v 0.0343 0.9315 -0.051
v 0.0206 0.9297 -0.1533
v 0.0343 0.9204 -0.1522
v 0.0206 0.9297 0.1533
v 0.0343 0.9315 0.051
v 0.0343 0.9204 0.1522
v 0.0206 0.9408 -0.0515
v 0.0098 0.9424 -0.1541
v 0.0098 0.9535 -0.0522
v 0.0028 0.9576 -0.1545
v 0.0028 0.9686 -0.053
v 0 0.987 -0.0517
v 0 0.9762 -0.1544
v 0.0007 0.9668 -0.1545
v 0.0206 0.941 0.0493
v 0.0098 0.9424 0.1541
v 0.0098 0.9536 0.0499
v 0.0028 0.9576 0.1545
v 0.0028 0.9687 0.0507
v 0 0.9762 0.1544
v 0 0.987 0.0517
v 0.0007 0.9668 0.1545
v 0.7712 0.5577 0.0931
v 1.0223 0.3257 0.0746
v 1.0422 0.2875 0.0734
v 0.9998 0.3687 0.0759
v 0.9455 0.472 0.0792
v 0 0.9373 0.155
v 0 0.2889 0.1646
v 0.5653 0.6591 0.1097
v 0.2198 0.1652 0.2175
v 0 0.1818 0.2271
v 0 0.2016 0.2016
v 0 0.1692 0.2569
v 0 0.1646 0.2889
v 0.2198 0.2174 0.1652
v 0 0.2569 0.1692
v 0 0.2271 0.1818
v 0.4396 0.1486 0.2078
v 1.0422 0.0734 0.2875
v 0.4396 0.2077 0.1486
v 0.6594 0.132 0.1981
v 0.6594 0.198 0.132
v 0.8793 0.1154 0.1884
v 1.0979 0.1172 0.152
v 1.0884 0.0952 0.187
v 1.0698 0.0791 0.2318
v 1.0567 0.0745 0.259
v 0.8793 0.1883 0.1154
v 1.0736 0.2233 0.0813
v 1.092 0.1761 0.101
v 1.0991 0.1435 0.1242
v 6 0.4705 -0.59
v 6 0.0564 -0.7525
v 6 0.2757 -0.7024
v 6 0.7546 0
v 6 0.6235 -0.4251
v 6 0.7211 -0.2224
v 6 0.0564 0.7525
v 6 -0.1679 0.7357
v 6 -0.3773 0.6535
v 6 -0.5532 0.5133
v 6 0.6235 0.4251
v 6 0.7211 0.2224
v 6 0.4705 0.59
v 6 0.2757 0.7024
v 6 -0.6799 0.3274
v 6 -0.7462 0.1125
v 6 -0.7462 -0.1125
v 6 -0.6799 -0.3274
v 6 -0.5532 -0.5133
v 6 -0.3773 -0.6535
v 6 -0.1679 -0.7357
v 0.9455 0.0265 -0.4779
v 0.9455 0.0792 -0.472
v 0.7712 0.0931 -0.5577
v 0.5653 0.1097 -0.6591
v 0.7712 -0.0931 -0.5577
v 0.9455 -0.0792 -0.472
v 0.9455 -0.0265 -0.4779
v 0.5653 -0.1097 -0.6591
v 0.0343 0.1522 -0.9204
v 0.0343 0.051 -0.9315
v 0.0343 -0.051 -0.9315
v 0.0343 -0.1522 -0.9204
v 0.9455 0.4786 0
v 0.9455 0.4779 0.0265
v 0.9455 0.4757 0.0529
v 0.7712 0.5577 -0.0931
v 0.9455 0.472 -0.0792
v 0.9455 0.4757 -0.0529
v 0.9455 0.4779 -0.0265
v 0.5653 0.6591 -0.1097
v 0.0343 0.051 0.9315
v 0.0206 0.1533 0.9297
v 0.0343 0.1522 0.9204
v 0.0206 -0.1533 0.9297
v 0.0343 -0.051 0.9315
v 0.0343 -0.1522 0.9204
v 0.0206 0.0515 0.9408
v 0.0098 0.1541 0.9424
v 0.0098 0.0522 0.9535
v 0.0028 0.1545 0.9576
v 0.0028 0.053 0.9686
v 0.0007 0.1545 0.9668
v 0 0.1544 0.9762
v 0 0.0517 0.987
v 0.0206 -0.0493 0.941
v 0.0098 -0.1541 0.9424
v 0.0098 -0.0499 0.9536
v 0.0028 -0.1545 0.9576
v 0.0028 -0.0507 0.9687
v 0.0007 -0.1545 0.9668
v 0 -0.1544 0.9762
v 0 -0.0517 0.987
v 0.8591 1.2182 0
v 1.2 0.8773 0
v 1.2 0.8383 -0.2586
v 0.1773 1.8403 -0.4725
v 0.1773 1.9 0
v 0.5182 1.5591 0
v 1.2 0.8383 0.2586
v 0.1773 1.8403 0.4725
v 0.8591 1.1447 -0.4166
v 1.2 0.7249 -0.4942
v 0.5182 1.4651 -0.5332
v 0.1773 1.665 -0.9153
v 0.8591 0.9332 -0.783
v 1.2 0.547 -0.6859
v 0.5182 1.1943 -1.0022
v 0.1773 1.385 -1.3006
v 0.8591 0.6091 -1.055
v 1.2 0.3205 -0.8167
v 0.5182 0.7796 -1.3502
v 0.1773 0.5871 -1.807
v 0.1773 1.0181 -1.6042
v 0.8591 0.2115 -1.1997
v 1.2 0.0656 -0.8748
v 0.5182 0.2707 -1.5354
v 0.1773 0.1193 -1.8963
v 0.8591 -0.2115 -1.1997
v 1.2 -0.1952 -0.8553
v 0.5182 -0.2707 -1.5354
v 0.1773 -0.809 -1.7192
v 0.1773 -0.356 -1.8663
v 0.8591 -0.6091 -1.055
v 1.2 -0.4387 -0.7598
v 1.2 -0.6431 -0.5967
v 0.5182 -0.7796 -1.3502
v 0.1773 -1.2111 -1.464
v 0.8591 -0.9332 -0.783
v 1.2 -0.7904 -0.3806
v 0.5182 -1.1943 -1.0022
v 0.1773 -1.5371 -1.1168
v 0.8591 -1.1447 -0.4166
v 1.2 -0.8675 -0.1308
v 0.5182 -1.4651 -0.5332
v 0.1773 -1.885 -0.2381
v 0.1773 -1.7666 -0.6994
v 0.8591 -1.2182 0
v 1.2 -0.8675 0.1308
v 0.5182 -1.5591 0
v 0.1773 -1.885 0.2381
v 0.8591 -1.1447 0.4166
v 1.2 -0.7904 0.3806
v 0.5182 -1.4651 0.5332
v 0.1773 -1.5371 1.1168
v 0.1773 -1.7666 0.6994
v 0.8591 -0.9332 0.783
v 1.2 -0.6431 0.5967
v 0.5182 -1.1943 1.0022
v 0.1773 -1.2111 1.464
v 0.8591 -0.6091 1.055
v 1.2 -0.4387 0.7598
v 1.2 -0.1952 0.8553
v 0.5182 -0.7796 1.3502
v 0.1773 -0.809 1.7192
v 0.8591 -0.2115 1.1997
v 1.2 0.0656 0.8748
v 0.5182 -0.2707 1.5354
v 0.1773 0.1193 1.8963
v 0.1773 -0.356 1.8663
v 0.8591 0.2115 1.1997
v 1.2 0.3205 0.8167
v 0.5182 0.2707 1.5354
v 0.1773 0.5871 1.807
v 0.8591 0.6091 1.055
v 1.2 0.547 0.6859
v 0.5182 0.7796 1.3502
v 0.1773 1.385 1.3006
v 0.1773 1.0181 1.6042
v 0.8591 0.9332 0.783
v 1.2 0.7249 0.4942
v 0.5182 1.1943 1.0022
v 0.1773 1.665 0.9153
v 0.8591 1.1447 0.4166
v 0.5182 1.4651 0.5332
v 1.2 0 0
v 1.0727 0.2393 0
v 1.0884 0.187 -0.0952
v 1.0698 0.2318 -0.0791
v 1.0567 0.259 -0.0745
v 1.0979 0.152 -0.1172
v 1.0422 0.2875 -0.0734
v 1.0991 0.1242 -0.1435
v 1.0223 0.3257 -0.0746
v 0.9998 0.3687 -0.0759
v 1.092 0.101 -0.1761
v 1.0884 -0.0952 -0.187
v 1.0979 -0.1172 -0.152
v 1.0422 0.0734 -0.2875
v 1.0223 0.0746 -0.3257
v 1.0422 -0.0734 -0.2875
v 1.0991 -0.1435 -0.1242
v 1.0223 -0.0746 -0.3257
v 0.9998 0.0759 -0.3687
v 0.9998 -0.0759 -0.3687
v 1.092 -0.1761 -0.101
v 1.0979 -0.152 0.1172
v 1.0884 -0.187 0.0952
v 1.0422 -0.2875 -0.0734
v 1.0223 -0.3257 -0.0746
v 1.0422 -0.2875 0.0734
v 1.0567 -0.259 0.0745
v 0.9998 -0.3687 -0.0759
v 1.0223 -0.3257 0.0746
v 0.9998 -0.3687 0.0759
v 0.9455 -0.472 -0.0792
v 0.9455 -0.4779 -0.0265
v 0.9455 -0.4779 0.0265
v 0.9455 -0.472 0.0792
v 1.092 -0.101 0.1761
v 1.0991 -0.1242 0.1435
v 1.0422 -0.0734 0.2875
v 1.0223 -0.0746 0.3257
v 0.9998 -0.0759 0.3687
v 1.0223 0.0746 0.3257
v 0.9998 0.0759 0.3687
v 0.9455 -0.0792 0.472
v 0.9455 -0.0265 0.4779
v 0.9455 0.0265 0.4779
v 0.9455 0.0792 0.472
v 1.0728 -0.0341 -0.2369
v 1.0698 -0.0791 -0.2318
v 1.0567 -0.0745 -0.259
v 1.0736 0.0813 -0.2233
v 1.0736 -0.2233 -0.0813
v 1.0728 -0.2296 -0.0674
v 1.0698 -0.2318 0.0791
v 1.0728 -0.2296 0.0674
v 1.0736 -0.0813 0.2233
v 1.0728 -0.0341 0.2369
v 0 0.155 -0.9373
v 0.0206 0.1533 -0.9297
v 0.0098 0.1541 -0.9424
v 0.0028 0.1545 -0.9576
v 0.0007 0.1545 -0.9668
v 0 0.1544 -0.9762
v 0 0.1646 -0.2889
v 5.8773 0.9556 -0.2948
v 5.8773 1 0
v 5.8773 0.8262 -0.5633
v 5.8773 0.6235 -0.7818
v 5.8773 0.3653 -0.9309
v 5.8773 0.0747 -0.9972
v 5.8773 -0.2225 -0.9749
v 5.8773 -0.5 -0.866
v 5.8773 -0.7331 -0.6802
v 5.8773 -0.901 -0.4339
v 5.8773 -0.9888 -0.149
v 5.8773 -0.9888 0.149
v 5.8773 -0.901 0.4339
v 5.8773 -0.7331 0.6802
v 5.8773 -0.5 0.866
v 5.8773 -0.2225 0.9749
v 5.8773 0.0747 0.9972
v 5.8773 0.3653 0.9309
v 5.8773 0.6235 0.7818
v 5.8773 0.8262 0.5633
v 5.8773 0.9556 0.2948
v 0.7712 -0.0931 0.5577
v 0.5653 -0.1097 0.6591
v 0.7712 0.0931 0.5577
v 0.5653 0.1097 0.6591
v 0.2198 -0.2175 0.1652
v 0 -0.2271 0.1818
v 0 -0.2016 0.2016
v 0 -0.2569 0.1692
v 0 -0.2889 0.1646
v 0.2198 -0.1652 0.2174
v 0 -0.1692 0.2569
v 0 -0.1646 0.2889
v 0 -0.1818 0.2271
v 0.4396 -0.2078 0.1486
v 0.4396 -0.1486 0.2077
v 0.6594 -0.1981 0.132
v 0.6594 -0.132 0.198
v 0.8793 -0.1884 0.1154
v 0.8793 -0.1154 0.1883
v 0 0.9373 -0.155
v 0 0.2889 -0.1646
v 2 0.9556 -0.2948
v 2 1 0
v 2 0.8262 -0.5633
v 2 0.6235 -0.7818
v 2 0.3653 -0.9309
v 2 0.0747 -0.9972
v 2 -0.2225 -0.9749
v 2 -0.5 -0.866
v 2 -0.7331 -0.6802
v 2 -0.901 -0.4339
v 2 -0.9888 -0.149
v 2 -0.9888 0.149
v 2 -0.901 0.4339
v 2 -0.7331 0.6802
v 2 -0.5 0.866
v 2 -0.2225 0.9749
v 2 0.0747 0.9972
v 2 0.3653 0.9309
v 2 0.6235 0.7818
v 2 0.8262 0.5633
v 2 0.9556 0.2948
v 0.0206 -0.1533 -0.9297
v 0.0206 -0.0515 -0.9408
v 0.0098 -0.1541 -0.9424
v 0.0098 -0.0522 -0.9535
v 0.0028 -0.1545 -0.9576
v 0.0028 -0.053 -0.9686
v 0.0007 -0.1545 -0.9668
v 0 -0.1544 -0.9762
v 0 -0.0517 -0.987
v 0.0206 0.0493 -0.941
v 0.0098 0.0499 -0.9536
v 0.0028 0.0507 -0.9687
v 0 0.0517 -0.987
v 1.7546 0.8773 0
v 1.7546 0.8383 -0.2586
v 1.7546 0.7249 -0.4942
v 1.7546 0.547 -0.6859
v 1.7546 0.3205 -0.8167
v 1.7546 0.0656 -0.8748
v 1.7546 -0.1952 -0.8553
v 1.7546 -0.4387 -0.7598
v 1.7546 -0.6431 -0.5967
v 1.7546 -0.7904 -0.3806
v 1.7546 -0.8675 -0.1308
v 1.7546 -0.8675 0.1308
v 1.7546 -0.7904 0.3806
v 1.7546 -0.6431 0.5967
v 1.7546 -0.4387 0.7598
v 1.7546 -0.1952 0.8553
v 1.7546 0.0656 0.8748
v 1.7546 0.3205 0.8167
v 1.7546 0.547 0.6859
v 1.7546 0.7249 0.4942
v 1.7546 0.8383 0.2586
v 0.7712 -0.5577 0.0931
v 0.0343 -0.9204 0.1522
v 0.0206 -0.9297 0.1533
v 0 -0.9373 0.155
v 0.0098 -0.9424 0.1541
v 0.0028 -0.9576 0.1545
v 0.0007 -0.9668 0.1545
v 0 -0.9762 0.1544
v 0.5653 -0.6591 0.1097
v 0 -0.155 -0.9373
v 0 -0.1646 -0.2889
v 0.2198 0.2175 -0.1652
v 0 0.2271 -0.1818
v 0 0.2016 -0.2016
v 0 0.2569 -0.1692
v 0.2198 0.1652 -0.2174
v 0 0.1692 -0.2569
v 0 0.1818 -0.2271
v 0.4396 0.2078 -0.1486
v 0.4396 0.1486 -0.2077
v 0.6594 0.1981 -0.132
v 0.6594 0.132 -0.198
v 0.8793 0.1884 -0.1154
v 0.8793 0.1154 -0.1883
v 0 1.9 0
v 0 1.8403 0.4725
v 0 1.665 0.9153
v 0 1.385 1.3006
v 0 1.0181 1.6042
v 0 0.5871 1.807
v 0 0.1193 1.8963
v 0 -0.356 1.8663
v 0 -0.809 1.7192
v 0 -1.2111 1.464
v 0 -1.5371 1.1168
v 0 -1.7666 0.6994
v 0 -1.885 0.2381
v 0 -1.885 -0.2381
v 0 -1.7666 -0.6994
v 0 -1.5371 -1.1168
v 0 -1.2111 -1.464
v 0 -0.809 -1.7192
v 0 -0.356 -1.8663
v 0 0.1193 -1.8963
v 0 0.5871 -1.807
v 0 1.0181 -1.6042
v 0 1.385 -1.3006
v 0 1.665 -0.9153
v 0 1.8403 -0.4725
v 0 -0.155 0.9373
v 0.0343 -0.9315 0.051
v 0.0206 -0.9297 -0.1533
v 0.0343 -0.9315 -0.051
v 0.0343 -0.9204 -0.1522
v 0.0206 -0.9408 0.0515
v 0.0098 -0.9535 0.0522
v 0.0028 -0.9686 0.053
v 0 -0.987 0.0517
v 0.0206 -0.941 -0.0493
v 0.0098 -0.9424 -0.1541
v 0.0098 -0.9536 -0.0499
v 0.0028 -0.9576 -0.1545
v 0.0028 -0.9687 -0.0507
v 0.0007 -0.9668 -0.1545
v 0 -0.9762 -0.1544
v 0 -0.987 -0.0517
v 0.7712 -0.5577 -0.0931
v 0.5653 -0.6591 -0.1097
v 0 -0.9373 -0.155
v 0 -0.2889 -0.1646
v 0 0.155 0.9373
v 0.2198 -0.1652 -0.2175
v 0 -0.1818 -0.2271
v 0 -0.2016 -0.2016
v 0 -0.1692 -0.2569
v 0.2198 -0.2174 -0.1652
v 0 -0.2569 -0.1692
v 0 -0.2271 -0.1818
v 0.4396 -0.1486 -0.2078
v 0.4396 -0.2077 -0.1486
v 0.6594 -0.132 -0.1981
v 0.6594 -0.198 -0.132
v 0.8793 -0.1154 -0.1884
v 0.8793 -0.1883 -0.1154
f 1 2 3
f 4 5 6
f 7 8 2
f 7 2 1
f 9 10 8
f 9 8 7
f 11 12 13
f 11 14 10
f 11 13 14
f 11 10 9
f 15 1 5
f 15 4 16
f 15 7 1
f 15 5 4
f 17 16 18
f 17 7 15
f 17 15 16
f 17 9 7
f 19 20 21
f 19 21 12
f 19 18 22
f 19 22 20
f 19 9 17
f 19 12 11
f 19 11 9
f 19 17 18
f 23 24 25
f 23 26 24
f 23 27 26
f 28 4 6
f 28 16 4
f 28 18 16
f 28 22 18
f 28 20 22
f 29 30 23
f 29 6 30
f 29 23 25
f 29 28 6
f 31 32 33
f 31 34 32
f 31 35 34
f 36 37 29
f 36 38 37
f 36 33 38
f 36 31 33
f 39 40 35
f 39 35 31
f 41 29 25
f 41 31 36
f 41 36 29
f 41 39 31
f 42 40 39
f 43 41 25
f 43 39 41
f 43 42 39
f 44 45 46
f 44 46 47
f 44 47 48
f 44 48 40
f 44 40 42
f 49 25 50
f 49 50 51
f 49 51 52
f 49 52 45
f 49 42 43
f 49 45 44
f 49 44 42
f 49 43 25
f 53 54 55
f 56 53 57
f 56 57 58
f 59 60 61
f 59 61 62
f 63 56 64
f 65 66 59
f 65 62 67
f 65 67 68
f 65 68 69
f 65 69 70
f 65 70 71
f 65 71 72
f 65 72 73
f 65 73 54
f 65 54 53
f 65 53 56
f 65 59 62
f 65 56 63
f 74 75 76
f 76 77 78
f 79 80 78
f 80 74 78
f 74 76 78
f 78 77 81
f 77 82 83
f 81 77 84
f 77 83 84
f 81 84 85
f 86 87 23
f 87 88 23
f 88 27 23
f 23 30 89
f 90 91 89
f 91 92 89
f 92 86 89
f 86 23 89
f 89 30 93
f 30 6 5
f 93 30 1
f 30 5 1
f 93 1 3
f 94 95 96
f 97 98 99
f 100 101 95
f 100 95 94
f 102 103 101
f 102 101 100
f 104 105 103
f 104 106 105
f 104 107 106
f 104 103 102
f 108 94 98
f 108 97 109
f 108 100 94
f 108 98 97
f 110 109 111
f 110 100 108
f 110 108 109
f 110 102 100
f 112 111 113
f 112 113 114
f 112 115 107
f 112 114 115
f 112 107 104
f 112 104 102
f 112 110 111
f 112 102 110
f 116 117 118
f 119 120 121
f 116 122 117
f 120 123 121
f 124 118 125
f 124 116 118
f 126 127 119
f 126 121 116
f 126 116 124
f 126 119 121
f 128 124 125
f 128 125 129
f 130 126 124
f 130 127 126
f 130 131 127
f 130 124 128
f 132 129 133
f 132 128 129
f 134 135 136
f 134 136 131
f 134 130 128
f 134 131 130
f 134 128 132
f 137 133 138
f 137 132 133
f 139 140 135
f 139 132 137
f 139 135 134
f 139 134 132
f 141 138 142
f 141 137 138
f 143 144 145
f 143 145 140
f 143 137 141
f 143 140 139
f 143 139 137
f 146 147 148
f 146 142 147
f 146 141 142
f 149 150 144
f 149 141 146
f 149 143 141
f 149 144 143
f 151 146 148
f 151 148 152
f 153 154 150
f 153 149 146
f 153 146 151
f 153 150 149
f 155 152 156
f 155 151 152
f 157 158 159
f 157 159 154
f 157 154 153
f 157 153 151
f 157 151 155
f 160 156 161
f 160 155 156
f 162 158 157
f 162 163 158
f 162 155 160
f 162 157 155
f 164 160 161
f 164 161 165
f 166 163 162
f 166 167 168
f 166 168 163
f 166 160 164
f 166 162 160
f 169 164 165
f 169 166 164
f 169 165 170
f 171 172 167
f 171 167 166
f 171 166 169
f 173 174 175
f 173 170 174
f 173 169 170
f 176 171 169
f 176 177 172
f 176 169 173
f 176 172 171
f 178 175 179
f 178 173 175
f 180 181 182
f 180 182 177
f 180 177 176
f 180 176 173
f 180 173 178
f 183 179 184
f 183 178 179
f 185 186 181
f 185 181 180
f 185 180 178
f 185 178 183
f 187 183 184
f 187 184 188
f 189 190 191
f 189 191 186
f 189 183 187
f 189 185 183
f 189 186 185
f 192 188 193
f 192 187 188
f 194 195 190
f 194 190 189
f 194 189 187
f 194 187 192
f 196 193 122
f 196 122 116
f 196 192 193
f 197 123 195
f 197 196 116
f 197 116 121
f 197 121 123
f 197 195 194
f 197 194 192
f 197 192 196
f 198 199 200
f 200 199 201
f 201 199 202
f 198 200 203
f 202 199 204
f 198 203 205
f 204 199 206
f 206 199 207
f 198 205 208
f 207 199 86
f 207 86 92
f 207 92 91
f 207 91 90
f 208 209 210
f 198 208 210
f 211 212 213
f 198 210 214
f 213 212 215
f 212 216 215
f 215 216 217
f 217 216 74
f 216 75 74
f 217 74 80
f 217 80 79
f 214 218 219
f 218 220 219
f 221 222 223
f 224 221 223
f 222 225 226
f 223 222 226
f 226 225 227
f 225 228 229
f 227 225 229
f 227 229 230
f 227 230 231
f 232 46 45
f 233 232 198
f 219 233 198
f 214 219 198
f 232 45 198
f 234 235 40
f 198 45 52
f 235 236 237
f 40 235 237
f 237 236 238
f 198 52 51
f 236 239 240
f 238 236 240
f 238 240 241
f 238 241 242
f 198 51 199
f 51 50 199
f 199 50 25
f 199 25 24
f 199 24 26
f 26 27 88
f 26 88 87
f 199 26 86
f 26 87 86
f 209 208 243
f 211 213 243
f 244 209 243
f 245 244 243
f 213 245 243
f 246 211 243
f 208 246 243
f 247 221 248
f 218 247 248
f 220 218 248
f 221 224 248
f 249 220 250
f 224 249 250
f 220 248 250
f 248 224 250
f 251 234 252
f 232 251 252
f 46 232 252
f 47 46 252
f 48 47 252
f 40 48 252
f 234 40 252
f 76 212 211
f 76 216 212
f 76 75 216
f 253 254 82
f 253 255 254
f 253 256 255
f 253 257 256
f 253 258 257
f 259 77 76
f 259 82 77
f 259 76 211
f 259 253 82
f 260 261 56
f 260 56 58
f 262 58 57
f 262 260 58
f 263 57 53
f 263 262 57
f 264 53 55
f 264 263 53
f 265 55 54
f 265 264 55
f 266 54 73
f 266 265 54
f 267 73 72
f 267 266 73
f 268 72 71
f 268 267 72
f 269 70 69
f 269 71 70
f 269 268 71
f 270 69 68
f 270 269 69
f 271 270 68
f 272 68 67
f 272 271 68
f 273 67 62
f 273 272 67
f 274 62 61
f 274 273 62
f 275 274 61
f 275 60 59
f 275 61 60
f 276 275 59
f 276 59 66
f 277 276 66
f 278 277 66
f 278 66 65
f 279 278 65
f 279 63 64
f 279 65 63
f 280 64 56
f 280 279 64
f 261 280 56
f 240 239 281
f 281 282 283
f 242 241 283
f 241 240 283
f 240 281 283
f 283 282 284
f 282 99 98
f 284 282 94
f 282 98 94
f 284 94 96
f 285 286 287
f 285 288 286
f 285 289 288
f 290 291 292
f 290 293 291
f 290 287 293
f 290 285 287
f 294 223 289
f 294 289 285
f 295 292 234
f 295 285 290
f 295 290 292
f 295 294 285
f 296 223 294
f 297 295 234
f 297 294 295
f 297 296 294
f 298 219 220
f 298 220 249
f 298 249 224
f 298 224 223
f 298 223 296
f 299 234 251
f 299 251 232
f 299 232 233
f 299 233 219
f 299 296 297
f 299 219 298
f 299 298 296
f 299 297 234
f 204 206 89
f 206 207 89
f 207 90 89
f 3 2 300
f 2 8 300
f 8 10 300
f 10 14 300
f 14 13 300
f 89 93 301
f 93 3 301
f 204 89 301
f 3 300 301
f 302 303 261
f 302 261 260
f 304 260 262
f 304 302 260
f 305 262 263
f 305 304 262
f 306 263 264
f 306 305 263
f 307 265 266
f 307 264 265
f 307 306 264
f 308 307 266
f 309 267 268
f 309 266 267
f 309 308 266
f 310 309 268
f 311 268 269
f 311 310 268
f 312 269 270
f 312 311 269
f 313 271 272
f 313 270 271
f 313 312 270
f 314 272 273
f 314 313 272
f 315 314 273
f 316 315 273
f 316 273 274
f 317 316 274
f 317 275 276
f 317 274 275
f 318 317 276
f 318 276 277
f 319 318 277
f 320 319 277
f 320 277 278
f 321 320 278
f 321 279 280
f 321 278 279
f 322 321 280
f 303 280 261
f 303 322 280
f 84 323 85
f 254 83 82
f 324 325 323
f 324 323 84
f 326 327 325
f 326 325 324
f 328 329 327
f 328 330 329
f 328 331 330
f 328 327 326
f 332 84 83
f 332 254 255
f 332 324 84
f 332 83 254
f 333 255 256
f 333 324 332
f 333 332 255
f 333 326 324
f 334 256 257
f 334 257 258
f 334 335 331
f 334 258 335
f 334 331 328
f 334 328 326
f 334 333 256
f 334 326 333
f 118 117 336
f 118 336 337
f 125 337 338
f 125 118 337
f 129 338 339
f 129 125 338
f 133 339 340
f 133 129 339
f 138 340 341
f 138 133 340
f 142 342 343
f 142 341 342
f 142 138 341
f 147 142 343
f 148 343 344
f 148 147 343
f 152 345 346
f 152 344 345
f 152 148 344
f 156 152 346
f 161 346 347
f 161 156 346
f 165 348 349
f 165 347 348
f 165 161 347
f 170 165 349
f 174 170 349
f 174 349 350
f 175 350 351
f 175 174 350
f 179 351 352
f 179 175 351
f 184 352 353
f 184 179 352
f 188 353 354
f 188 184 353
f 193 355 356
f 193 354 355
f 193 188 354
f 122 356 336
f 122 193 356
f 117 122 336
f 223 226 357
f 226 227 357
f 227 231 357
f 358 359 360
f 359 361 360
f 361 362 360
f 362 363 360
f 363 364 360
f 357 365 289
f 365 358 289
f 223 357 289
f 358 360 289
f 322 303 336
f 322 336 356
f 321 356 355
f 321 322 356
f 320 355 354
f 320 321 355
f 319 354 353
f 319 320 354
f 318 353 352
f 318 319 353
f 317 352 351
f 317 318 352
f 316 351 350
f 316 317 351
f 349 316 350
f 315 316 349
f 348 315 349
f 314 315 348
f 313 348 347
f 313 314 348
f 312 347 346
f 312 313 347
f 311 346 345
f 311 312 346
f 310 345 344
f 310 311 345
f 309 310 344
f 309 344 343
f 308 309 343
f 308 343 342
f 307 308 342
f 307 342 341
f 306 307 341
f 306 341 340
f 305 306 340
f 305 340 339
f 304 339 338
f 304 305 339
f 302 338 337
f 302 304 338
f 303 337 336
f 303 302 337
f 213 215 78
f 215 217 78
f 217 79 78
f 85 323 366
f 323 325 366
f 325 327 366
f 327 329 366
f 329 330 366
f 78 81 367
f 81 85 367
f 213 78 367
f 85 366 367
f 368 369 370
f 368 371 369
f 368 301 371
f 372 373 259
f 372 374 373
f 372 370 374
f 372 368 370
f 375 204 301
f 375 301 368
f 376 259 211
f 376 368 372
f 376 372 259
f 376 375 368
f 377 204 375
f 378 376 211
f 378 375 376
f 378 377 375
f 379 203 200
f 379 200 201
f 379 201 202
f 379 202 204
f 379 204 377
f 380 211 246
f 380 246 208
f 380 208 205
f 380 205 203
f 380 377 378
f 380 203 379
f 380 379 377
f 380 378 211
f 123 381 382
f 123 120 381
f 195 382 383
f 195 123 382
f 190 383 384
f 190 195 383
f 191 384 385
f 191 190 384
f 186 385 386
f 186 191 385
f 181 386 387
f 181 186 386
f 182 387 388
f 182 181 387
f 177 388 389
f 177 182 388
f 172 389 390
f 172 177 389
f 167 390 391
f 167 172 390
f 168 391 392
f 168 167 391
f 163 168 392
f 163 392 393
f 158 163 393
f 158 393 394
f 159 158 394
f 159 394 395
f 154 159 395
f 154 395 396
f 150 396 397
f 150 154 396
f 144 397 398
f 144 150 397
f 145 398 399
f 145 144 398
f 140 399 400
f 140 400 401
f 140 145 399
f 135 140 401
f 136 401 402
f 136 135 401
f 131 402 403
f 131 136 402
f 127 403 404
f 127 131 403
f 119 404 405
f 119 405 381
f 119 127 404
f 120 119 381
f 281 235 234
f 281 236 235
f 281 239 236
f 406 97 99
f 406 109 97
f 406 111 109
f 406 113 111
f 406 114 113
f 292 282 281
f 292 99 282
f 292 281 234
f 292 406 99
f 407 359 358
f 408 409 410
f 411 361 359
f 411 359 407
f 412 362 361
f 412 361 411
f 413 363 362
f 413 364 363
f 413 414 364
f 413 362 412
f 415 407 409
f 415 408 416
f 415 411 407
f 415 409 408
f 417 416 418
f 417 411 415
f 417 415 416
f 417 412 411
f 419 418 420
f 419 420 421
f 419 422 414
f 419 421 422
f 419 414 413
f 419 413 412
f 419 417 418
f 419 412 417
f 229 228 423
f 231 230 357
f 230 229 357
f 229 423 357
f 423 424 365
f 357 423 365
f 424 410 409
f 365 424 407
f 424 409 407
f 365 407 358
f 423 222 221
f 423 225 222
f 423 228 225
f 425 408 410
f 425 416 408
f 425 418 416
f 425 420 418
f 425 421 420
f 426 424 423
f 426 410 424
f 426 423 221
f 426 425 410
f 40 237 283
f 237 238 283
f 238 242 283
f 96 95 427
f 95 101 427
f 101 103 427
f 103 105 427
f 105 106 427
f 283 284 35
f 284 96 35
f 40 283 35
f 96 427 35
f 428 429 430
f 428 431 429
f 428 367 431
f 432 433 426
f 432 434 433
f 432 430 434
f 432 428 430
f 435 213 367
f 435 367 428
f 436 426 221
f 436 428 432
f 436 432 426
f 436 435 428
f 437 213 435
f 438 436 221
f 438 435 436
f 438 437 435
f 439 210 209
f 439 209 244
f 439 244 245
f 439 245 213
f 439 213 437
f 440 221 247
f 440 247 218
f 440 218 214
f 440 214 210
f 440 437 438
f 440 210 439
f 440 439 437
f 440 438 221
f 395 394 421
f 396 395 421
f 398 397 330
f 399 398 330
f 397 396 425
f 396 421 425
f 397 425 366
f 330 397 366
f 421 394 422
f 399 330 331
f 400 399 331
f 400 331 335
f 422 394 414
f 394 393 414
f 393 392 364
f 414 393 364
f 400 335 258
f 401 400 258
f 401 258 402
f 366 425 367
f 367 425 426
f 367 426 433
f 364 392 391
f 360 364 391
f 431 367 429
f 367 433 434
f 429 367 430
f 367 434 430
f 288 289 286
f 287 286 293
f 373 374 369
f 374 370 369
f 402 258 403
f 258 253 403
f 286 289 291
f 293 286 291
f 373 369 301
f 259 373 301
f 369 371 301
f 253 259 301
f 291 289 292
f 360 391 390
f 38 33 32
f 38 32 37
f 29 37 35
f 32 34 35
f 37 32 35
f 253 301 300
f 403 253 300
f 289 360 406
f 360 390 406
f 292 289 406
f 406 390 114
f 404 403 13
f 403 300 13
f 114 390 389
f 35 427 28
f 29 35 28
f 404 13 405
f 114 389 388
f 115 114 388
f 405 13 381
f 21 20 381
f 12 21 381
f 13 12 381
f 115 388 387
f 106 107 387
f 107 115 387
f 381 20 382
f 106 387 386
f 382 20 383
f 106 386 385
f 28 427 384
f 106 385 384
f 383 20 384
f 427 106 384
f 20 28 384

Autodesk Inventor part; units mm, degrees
ref_plane "YZ Plane" through (0, 0, 0) normal (1, 0, 0) x (0, 1, 0)
ref_plane "XZ Plane" through (0, 0, 0) normal (0, 1, 0) x (-1, 0, 0)
sketch "Sketch1" plane through (0, 0, 0) normal (0, 0, 1) x (1, 0, 0)
  line L0 (1.2, 0) -> (6, 0)
  line L1 (6, 0) -> (6, 1)
  line L2 (6, 1) -> (2, 1)
  line L3 (2, 1) -> (1.7546, 0.8773)
  line L4 (1.7546, 0.8773) -> (1.2, 0.8773)
  line L5 (0, 1.9) -> (0, 0.95)
  line L6 (0, 0.95) -> (0.9455, 0.4786)
  line L7 (0.9455, 0.4786) -> (1.2, 0)
  line L8 (-1.2, 0) -> (7.2, 0) projected
  line L9 (0, -0.38) -> (0, 2.28) projected
  line L10 (0, 1.9) -> (0.1773, 1.9)
  line L11 (0.1773, 1.9) -> (1.2, 0.8773)
  line L12 (2, 1) -> (1.0773, 1) construction
  dimension "d1" = 4
  dimension "d2" = 2
  dimension "d3" = 1.7546
  dimension "d4" = 1.9
  dimension "d5" = 26.5
  dimension "d6" = 62
  dimension "d7" = 1.2
  dimension "d8" = 0.2454
  dimension "d12" = 3.8
  dimension "d13" = 45
  dimension "d15" = 6
  dimension "d24" = 1.2
revolve "Body" add sketch "Sketch1" angle 360 about axis through (1.2, 0, 0) along (1, 0, 0) contours L7 L6 L5 L10 L11 L4 L3 L2 L1 L0
sketch "Sketch2" plane through (0, 0, 0) normal (-1, 0, 0) x (0, 0, 1)
  line L0 (0, 0.95) -> (0, 0) construction
  line L1 (0, 0) -> (0.95, 0) construction
  arc A0 (0.285, 0) -> (0, 0.285) centre (0, 0) ccw construction
  arc A1 (0.3325, 0) -> (0, 0.3325) centre (0, 0) ccw construction
  arc A2 (0.9373, 0.155) -> (0.155, 0.9373) centre (0, 0) ccw
  line L2 (0, 0) -> (0.6718, 0.6718) construction
  line L3 (0.155, 0.9373) -> (0.1646, 0.2889)
  line L4 (0.9373, 0.155) -> (0.2889, 0.1646)
  arc A3 (0.155, 0.9373) -> (0, 0.95) centre (0, 0) ccw
  arc A4 (0.95, 0) -> (0.9373, 0.155) centre (0, 0) ccw
  line L5 (0, -2.66) -> (0, 2.66) projected
  line L6 (-2.66, 0) -> (2.66, 0) projected
  arc A5 (0.155, -0.9373) -> (0.9373, -0.155) centre (0, 0) ccw
  line L7 (0.155, -0.9373) -> (0.1646, -0.2889)
  line L8 (0.9373, -0.155) -> (0.2889, -0.1646)
  arc A6 (0, -0.95) -> (0.155, -0.9373) centre (0, 0) ccw
  arc A7 (0.9373, -0.155) -> (0.95, 0) centre (0, 0) ccw
  arc A8 (-0.155, 0.9373) -> (-0.9373, 0.155) centre (0, 0) ccw
  line L9 (-0.155, 0.9373) -> (-0.1646, 0.2889)
  line L10 (-0.9373, 0.155) -> (-0.2889, 0.1646)
  arc A9 (0, 0.95) -> (-0.155, 0.9373) centre (0, 0) ccw
  arc A10 (-0.9373, 0.155) -> (-0.95, 0) centre (0, 0) ccw
  arc A11 (-0.155, -0.9373) -> (0, -0.95) centre (0, 0) ccw
  arc A12 (-0.9373, -0.155) -> (-0.155, -0.9373) centre (0, 0) ccw
  arc A13 (-0.95, 0) -> (-0.9373, -0.155) centre (0, 0) ccw
  line L11 (-0.9373, -0.155) -> (-0.2889, -0.1646)
  line L12 (-0.155, -0.9373) -> (-0.1646, -0.2889)
  arc A14 (0.1646, 0.2889) -> (0.2889, 0.1646) centre (0.2908, 0.2908) ccw
  arc A15 (0.2889, -0.1646) -> (0.1646, -0.2889) centre (0.2908, -0.2908) ccw
  arc A16 (-0.2889, 0.1646) -> (-0.1646, 0.2889) centre (-0.2908, 0.2908) ccw
  arc A17 (-0.1646, -0.2889) -> (-0.2889, -0.1646) centre (-0.2908, -0.2908) ccw
  point P0 (0.6718, -0.6718)
  point P1 (-0.6718, 0.6718)
  point P2 (-0.6718, -0.6718)
  dimension "d17" = 0.57
  dimension "d18" = 0.665
  dimension "d19" = 1.9
  dimension "d20" = 45
  dimension "d21" = 0.155
extrude "Slot" add sketch "Sketch2" against normal up to next draft 5 contours L4 A14 L3 A2 | A5 L7 A15 L8 | L9 A16 L10 A8 | A12 L11 A17 L12
fillet "Fillet1" radius 0.062 4 edges at (0, 0.95, 0) (0, 0, -0.95) (0, -0.95, 0) (0, 0, 0.95)
thread "Thread" size "M2x0.4" class "6g" standard "ISO Metric profile" length 4
chamfer "Chamfer1" distance 0.2454 distance2 0.1227 1 edges at (6, -1, 0) measured on face at (6, 0.3275, -0.4215)
ref_plane "Work Plane2" through (3.35, 0, 0) normal (0, 0, -1) x (1, 0, 0)
equation "\"d1\" = GEL"
equation "\"d2\" = GD"
equation "\"d3\" = BDM"
equation "\"d4\" = SDM"
equation "\"d7\" = INTI"
equation "\"d8\" = GAL"
equation "\"d12\" = KOD"
equation "\"d13\" = 0.5 * SEWI"
equation "\"d15\" = NLG"
equation "\"d24\" = KOH"
equation "\"d17\" = 0.3 * SDM"
equation "\"d18\" = 0.35 * SDM"
equation "\"d19\" = SDM"
equation "\"d21\" = 0.5 * SBR"
equation "\"d23\" = 0.2 * SBR"
equation "\"d10\" = GEL"
equation "\"d25\" = -0.5 * SPD + 0.5 * GD"
equation "\"d26\" = 0.5 * GAL"
equation "\"NLG\" = 6"
equation "\"GEL\" = 4"
equation "\"GAL\" = 0.61345 * PTC"
equation "\"SPD\" = NND - 1.2269 * PTC"
equation "\"KOD\" = 3.8"
equation "\"KOH\" = 1.2"
equation "\"SBR\" = 0.31"
equation "\"INTI\" = 1.2"
equation "\"SDM\" = 1.9"
equation "\"GD\" = NND"
equation "\"BDM\" = NND - GAL"
equation "\"SEWI\" = 90deg"
equation "\"d9\" = SDM"
equation "\"GUL\" = 0.61345 * PTC"
equation "\"TOA\" = 30deg"
equation "\"EPV\" = 2.2"
equation "\"THREADDIA\" = 2"
equation "\"PTC\" = 0.4"
equation "\"NND\" = 2"
equation "\"GD1\" = THREADDIA - 1.2269 * PTC"
properties part number "ISO 7046-1 - M2 x 6 - 4.8 - H" material "Steel"
